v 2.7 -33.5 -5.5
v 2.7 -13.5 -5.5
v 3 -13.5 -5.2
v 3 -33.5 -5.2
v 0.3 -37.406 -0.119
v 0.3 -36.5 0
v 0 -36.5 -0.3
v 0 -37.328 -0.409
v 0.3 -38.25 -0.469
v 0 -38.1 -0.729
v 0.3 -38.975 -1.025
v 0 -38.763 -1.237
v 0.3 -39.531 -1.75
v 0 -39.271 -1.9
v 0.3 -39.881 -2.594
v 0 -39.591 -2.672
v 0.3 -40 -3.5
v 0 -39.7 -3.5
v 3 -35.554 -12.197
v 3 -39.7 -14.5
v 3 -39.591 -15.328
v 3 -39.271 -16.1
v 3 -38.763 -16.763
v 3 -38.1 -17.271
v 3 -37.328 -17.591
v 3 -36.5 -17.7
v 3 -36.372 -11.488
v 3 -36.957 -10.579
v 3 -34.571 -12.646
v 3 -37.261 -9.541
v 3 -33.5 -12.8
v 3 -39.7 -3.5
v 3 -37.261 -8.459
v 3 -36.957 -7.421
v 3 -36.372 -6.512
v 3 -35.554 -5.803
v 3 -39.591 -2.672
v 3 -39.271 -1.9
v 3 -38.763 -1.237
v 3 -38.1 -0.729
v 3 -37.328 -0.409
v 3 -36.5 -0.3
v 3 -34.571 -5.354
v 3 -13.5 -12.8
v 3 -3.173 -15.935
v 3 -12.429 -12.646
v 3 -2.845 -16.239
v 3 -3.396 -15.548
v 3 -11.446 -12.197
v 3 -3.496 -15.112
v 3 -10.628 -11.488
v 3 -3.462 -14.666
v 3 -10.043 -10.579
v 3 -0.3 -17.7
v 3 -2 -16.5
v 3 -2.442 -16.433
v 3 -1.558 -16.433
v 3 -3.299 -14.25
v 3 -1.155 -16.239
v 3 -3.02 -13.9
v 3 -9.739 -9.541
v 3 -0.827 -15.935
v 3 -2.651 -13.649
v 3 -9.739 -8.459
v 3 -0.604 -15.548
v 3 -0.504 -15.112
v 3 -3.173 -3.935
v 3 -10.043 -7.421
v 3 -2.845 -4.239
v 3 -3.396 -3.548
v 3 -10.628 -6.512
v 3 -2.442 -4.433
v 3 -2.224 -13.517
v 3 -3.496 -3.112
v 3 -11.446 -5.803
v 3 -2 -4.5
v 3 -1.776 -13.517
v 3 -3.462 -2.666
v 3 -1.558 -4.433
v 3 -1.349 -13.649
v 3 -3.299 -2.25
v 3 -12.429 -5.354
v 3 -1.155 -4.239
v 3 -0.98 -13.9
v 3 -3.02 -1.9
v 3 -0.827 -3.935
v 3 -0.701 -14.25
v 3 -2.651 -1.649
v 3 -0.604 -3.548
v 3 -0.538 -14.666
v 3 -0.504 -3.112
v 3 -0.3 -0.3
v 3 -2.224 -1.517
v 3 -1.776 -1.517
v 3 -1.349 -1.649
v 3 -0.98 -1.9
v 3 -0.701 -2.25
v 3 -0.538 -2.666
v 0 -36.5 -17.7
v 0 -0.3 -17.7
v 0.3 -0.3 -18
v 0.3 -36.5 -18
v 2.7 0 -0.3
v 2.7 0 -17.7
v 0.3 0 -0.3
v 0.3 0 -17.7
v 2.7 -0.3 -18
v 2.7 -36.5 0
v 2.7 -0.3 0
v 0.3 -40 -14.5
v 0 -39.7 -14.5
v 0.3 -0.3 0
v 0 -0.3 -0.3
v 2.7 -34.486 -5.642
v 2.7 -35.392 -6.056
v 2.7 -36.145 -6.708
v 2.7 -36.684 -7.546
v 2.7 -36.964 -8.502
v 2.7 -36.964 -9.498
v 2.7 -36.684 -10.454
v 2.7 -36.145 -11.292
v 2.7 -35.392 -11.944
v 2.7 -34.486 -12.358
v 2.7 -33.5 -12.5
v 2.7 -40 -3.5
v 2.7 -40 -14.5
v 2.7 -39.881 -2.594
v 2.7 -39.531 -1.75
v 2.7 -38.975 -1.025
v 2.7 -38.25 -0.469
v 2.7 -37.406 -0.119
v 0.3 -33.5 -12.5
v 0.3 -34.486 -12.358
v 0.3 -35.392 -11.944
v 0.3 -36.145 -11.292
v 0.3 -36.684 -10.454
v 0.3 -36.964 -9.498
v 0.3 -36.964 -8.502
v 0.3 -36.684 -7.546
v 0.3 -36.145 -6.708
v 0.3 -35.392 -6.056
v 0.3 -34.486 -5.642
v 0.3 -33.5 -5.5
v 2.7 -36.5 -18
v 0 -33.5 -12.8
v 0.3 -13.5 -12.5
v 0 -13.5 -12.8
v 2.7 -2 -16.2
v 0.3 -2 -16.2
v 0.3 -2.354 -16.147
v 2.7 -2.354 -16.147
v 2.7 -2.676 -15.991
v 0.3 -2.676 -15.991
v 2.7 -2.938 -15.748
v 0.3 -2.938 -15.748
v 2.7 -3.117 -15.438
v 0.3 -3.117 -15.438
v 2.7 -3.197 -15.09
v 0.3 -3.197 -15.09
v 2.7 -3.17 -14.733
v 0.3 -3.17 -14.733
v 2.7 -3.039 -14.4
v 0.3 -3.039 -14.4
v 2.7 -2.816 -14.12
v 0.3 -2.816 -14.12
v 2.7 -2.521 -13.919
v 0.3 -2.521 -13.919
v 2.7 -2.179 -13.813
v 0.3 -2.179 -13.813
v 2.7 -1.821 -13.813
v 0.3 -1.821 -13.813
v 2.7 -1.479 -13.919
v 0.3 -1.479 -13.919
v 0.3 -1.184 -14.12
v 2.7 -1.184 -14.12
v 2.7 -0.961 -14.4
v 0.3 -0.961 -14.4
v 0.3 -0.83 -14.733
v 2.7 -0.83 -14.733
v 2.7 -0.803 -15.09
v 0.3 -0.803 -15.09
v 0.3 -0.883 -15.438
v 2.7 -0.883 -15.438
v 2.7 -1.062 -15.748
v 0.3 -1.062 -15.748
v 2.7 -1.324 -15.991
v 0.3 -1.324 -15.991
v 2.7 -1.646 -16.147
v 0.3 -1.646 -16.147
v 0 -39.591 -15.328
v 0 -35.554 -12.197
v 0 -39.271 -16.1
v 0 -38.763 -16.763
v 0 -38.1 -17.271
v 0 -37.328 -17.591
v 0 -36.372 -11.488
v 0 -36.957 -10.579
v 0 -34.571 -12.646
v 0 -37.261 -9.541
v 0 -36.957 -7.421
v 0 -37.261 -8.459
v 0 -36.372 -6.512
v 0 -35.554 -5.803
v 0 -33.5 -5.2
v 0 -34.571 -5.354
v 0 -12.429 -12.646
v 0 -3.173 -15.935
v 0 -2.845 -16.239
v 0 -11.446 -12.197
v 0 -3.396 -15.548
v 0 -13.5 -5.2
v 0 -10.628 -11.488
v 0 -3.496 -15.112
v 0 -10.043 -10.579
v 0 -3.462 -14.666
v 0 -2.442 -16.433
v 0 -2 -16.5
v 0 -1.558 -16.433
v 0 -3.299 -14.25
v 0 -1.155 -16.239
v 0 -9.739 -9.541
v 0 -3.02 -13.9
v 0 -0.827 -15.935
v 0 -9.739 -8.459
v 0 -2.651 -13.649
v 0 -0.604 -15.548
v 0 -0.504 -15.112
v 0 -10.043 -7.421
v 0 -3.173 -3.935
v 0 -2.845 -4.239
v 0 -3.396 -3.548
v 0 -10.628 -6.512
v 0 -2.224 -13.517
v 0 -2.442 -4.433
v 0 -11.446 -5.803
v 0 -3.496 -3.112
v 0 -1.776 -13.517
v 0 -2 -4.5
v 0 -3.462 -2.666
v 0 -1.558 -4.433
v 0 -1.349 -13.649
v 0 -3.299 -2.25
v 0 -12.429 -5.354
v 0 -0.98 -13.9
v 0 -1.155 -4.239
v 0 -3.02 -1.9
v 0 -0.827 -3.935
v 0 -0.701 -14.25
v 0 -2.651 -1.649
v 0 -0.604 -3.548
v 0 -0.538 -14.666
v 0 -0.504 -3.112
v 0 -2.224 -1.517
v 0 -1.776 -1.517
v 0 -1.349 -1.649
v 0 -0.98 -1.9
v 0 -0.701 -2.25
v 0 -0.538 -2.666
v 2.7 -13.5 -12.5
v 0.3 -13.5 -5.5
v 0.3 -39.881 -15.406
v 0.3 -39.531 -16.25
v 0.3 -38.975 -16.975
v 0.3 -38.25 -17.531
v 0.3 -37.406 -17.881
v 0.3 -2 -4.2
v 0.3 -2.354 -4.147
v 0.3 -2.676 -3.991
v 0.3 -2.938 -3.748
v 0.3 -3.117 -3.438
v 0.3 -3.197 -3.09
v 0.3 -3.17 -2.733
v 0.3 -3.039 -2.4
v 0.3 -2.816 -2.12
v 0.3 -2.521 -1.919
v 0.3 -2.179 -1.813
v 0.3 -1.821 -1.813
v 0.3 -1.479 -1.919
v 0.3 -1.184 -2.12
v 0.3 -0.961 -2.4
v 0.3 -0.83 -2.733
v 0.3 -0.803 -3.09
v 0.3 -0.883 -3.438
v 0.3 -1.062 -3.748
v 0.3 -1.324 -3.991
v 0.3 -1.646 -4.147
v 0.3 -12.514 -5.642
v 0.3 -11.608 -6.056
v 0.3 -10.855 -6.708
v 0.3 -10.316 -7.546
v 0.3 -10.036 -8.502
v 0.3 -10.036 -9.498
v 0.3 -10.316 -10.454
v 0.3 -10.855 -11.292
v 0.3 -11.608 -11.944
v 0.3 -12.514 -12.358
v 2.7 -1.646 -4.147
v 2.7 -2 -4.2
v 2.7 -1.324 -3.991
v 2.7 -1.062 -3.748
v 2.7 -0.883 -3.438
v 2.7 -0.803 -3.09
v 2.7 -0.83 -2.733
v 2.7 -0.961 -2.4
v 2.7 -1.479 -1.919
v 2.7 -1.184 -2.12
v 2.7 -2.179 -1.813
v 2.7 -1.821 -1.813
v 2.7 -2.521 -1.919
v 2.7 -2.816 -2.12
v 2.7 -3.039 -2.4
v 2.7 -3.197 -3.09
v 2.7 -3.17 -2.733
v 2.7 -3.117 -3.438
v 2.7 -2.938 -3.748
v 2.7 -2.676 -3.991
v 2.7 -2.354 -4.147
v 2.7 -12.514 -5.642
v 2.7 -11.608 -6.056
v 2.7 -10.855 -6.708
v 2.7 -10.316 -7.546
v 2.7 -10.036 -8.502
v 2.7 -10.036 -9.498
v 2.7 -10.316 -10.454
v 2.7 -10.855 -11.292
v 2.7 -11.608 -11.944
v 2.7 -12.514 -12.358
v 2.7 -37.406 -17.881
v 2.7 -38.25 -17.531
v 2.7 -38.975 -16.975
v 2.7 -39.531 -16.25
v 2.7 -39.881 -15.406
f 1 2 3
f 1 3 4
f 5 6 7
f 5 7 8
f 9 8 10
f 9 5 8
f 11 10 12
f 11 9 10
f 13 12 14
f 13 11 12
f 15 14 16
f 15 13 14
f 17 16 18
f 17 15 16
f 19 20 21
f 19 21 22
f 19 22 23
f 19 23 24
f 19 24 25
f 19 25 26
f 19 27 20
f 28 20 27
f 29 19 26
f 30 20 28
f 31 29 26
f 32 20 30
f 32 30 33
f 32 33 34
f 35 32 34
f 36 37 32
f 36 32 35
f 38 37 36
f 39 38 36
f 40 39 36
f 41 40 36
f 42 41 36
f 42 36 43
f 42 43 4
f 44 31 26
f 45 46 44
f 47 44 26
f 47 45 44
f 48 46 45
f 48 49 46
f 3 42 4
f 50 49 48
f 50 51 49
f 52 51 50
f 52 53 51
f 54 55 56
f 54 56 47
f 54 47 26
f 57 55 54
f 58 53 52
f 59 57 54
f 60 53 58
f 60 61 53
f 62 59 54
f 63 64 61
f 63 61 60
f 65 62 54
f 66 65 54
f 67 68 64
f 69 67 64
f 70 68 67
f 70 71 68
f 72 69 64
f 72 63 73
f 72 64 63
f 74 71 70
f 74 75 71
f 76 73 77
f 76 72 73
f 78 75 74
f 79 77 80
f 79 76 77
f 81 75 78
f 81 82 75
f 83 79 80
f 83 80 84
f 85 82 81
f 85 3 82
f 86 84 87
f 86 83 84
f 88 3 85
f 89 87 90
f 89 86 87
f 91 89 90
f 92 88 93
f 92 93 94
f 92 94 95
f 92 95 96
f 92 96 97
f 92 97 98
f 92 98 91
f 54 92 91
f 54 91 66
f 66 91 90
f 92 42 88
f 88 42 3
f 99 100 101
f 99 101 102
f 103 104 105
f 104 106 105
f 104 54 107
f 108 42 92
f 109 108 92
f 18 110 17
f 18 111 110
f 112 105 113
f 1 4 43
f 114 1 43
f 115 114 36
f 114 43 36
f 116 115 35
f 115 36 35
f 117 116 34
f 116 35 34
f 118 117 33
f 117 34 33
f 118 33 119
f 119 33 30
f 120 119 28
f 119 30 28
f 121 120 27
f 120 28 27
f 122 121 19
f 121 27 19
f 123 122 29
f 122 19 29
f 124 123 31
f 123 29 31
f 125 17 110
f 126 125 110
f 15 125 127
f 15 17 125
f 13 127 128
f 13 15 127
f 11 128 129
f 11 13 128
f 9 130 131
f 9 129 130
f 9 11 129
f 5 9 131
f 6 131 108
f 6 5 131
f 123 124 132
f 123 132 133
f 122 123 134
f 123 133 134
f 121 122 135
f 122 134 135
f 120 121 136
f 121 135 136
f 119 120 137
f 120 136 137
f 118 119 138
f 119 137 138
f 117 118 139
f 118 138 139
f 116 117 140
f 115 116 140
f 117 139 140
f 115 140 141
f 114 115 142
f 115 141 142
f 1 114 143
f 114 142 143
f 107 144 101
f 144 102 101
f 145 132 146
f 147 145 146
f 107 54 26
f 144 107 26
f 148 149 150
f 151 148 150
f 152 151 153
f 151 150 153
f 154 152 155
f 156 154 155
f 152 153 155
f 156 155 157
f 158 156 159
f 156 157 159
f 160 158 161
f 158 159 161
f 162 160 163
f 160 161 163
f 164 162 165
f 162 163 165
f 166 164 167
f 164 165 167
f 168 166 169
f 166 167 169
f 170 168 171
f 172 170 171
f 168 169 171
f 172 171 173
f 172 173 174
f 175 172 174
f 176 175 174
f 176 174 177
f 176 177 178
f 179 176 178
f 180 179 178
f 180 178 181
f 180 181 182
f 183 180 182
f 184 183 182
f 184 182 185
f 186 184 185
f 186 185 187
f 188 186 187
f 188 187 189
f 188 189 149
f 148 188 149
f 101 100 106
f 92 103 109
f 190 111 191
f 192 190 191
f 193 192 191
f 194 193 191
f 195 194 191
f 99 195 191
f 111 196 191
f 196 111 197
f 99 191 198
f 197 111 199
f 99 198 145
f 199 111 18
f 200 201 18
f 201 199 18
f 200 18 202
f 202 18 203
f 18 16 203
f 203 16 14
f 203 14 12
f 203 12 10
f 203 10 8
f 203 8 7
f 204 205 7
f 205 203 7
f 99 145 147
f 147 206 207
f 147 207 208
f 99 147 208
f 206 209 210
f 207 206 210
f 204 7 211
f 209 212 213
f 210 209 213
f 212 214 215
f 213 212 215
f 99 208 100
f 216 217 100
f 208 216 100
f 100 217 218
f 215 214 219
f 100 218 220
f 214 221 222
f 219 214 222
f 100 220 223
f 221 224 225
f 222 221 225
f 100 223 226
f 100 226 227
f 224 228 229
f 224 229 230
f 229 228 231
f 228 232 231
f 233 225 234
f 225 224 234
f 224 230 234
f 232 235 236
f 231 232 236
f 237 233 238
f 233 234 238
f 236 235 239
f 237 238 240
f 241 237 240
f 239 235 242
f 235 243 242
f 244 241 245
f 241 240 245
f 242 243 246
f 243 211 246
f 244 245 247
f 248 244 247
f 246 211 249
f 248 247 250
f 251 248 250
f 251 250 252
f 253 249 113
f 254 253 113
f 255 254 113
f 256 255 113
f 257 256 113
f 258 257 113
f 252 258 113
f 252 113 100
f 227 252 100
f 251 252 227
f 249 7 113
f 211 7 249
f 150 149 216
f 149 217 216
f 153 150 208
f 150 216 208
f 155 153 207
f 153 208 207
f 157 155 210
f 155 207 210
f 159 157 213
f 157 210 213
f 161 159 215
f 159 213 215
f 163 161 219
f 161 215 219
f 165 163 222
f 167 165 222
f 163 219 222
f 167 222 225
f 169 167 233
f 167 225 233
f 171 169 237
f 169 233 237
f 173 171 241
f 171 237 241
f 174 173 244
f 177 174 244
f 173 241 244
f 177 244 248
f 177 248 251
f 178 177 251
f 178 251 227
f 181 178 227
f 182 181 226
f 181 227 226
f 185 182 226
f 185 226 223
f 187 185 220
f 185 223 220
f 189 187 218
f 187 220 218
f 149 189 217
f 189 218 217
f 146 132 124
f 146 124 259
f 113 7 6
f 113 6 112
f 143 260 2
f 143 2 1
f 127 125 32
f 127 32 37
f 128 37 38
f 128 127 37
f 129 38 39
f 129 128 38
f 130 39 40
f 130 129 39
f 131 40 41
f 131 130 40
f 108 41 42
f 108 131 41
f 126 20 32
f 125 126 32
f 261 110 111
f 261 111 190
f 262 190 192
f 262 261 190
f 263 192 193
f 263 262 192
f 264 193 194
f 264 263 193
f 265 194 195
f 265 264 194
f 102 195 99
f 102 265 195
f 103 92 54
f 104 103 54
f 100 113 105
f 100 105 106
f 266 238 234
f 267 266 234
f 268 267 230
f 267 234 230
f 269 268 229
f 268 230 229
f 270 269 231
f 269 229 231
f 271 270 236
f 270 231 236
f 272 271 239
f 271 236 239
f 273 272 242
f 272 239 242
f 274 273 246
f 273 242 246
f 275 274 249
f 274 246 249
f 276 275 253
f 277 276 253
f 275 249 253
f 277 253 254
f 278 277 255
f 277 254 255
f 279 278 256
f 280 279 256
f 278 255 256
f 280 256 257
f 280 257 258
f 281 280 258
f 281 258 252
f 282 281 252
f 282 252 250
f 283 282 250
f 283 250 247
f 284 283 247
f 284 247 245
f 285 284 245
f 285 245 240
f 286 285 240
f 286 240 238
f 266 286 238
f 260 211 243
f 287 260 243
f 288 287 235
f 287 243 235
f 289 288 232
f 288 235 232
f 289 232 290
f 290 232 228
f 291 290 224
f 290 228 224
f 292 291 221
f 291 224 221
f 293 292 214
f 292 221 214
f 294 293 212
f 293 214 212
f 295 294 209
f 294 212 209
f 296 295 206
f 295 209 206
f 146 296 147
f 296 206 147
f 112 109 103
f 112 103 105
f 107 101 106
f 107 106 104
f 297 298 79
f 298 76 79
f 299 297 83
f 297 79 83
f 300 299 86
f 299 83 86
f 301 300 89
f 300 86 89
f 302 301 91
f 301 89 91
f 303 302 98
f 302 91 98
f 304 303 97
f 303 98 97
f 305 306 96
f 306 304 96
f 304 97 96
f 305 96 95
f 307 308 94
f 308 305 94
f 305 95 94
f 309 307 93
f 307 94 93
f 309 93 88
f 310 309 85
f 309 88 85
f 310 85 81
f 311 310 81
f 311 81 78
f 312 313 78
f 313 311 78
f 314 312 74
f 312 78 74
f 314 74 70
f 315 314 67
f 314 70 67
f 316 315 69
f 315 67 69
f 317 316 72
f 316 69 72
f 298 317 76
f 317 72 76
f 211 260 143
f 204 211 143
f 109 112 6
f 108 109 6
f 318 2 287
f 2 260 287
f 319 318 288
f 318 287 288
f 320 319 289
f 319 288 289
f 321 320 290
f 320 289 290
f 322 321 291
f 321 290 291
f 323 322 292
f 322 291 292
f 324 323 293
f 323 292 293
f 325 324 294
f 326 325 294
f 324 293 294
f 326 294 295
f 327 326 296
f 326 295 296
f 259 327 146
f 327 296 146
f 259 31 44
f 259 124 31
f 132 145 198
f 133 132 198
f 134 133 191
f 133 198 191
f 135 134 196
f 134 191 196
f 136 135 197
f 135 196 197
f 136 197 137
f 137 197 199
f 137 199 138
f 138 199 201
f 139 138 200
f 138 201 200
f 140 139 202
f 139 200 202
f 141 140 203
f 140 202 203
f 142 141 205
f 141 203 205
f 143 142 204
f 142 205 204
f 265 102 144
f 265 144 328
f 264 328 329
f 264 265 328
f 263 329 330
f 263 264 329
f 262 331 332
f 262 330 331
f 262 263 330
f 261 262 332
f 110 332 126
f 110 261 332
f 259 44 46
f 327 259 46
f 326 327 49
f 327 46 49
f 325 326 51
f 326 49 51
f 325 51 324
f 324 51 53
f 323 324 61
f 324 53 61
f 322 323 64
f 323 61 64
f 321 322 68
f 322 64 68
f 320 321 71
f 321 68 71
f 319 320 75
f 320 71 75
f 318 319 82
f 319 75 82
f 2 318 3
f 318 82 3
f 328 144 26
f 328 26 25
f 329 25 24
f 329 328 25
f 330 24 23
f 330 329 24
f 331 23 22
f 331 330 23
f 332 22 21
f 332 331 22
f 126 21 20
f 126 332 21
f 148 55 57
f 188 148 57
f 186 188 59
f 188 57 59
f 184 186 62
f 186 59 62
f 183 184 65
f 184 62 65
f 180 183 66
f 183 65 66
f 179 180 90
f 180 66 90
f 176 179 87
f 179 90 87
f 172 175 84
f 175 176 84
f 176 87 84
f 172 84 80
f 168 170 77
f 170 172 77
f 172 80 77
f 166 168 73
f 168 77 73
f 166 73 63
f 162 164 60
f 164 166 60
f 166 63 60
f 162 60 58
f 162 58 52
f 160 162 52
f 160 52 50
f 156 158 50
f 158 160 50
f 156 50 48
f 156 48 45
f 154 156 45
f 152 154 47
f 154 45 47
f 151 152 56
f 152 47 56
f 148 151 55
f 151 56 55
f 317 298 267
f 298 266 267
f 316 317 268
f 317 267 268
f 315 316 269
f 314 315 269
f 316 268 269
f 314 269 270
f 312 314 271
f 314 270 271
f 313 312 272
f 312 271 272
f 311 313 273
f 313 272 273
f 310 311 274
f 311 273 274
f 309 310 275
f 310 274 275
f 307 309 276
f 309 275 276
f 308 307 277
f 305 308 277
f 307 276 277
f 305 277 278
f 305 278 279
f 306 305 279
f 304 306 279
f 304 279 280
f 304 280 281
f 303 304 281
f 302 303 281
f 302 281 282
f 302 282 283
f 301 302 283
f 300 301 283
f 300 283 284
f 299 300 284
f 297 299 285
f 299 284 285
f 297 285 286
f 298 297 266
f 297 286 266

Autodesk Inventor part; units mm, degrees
ref_plane "YZ Plane" through (0, 0, 0) normal (1, 0, 0) x (0, 1, 0)
ref_plane "XZ Plane" through (0, 0, 0) normal (0, 1, 0) x (-1, 0, 0)
ref_plane "XY Plane" through (0, 0, 0) normal (0, 0, 1) x (1, 0, 0)
sketch "Sketch1" plane through (0, 0, 0) normal (1, 0, 0) x (0, 1, 0)
  line L0 (0, 0) -> (-36.5, 0)
  line L1 (-40, -3.5) -> (-40, -14.5)
  line L2 (-36.5, -18) -> (0, -18)
  line L3 (0, -18) -> (0, 0)
  line L4 (-13.5, -5.5) -> (-33.5, -5.5)
  line L5 (-37, -9) -> (-37, -9)
  line L6 (-33.5, -12.5) -> (-13.5, -12.5)
  line L7 (-10, -9) -> (-10, -9)
  arc A0 (-37, -9) -> (-33.5, -12.5) centre (-33.5, -9) ccw
  arc A1 (-33.5, -5.5) -> (-37, -9) centre (-33.5, -9) ccw
  arc A2 (-10, -9) -> (-13.5, -5.5) centre (-13.5, -9) ccw
  arc A3 (-13.5, -12.5) -> (-10, -9) centre (-13.5, -9) ccw
  arc A4 (-36.5, 0) -> (-40, -3.5) centre (-36.5, -3.5) ccw
  arc A5 (-40, -14.5) -> (-36.5, -18) centre (-36.5, -14.5) ccw
  point P0 (-40, -18)
  point P1 (-10, -5.5)
  point P2 (-37, -12.5)
  point P3 (-10, -12.5)
  dimension "d0" = 40
  dimension "d1" = 18
  dimension "d2" = 27
  dimension "d3" = 7
  dimension "d4" = 5.5
  dimension "d5" = 10
  dimension "d6" = 3.5
extrude "Extrusion1" add sketch "Sketch1" along normal blind 3
sketch "Sketch2" plane through (3, 0, 0) normal (1, 0, 0) x (0, 0, -1)
  line L0 (18, 0) -> (0, 0) projected
  line L1 (0, 0) -> (0, -36.5) projected
  line L2 (18, -36.5) -> (18, 0) projected
  point P0 (3, -2)
  point P1 (15, -2)
  dimension "d9" = 2
  dimension "d10" = 2
  dimension "d11" = 3
  dimension "d12" = 3
hole "Hole1" at (3, -2, -3) at (3, -2, -15) direction (-1, 0, 0) diameter 2.4 depth 8.8 tip angle 118
chamfer "Chamfer1" distance 0.3 angle 45 26 edges at (0, 0, -9) (3, 0, -9) (1.5, 0, 0) (3, -18.25, 0) (3, -38.9749, -1.0251) (3, -40, -9) (3, -38.9749, -16.9749) (3, -18.25, -18) (0, -18.25, 0) (0, -38.9749, -1.0251) (0, -40, -9) (0, -38.9749, -16.9749) (0, -18.25, -18) (3, -2, -13.8) (3, -2, -1.8) (3, -10, -9) (3, -23.5, -12.5) (3, -37, -9) (3, -23.5, -5.5) (0, -23.5, -12.5) (0, -10, -9) (0, -23.5, -5.5) (0, -37, -9) (1.5, 0, -18) (0, -2, -13.8) (0, -2, -1.8)
properties part number "Ramka2" material "Steel(1)"
